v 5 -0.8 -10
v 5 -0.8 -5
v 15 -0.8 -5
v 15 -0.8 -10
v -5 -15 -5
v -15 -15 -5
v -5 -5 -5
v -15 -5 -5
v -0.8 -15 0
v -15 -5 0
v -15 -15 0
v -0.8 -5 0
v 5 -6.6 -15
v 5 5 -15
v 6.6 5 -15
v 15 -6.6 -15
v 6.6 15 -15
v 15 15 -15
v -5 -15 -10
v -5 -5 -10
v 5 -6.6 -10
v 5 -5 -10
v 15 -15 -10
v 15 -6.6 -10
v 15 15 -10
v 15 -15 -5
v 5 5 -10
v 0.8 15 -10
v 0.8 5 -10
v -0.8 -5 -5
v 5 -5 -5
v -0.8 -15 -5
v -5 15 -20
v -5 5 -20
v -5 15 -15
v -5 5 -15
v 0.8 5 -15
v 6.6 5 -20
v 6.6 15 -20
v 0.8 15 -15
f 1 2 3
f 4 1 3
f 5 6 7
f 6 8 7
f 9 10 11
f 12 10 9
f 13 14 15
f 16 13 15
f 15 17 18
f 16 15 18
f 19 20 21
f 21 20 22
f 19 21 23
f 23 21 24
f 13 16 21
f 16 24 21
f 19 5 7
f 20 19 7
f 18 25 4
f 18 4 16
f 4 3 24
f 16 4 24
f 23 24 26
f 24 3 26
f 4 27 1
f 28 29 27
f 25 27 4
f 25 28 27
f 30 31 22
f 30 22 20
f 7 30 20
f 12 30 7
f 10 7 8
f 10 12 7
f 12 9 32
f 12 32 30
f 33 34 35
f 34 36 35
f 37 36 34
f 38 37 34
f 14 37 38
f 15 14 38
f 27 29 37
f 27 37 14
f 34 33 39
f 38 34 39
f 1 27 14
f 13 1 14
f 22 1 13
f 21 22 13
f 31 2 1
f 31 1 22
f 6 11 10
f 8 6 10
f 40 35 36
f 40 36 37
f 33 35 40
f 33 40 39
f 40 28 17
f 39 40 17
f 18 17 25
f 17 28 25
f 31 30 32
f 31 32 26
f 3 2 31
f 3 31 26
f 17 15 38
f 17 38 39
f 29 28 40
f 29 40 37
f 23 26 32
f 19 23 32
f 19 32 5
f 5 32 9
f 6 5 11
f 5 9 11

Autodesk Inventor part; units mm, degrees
ref_plane "YZ Plane" through (0, 0, 0) normal (1, 0, 0) x (0, 1, 0)
ref_plane "XZ Plane" through (0, 0, 0) normal (0, 1, 0) x (-1, 0, 0)
ref_plane "XY Plane" through (0, 0, 0) normal (0, 0, 1) x (1, 0, 0)
sketch "草圖15" plane through (0, 0, 0) normal (0, 0, 1) x (1, 0, 0)
  line L0 (5, -5) -> (-5, -5)
  line L1 (-5, -5) -> (-5, 5)
  line L2 (-5, 5) -> (5, 5)
  line L3 (5, 5) -> (5, -5)
  line L4 (5, -5) -> (-5, 5) construction
  line L5 (-5, -5) -> (5, 5) construction
  line L6 (15, -15) -> (-15, -15)
  line L7 (-15, -15) -> (-15, 15)
  line L8 (-15, 15) -> (15, 15)
  line L9 (15, 15) -> (15, -15)
  line L10 (15, -15) -> (-15, 15) construction
  line L11 (-15, -15) -> (15, 15) construction
  line L12 (-15, -15) -> (-0.8, -15)
  line L13 (-0.8, -15) -> (-0.8, -5)
  line L14 (-0.8, -5) -> (-15, -5)
  line L15 (-15, -5) -> (-15, -15)
  line L16 (15, -15) -> (-1.6, -15)
  line L17 (-1.6, -5) -> (15, -5)
  line L18 (15, -5) -> (15, -15)
  line L19 (15, -15) -> (5, -15)
  line L20 (5, -15) -> (5, -0.8)
  line L21 (5, -0.8) -> (15, -0.8)
  line L22 (15, -0.8) -> (15, -15)
  line L23 (15, 15) -> (5, 15)
  line L24 (5, 15) -> (5, -1.6)
  line L25 (15, -1.6) -> (15, 15)
  line L26 (15, 15) -> (0.8, 15)
  line L27 (0.8, 15) -> (0.8, 5)
  line L28 (0.8, 5) -> (15, 5)
  line L29 (15, 5) -> (15, 15)
  line L30 (-15, 15) -> (1.6, 15)
  line L31 (1.6, 5) -> (-15, 5)
  line L32 (-15, 5) -> (-15, 15)
  line L33 (-5, -5) -> (-15, -5)
  line L34 (-15, -5) -> (-15, -15)
  line L35 (-15, -15) -> (-5, -15)
  line L36 (-5, -15) -> (-5, -5)
  line L37 (-0.8, -15) -> (-6.6, -15)
  line L38 (-6.6, -15) -> (-6.6, -5)
  line L39 (-6.6, -5) -> (-0.8, -5)
  line L40 (-0.8, -5) -> (-0.8, -15)
  line L41 (5, -0.8) -> (15, -0.8)
  line L42 (15, -0.8) -> (15, -6.6)
  line L43 (15, -6.6) -> (5, -6.6)
  line L44 (5, -6.6) -> (5, -0.8)
  line L45 (0.8, 5) -> (6.6, 5)
  line L46 (6.6, 5) -> (6.6, 15)
  line L47 (6.6, 15) -> (0.8, 15)
  line L48 (0.8, 15) -> (0.8, 5)
  line L49 (0.8, 5) -> (-5, 5)
  line L50 (-5, 5) -> (-5, 15)
  line L51 (-5, 15) -> (0.8, 15)
  line L52 (0.8, 15) -> (0.8, 5)
  point P0 (0, 0)
  point P1 (0, 0)
  point P2 (-15, -5)
  point P3 (15, -0.8)
  point P4 (5, -15)
  point P5 (0.8, 15)
  point P6 (-15, 5)
  point P7 (-5, 5)
  point P8 (15, -5)
  point P9 (-5, -15)
  point P10 (5, 5)
  point P11 (5, 15)
  point P12 (0.8, 15)
  point P13 (-6.6, -5)
  point P14 (-6.6, -15)
  point P15 (5, -6.6)
  point P16 (15, -6.6)
  point P17 (-5, 5)
  point P18 (5, 5)
  point P19 (6.6, 5)
  point P20 (6.6, 15)
  dimension "d38" = 10
  dimension "d39" = 10
  dimension "d40" = 0.8
  dimension "d42" = 0.8
  dimension "d48" = 0.8
  dimension "d54" = 0
  dimension "d55" = 5.8
  dimension "d56" = 5.8
  dimension "d57" = 5.8
  dimension "d58" = 10
extrude "擠出10" add sketch "草圖15" against normal blind 5 contours L13 L6 L36 L0 | L36 L6 L38 L14 | L38 L6 L7 L14
extrude "擠出11" add sketch "草圖15" against normal blind 5 from surface at -5 contours L20 L6 L13 L0 | L3 L21 L9 L17 | L17 L9 L43 L20 | L13 L6 L36 L0 | L43 L9 L6 L20
extrude "擠出12" add sketch "草圖15" against normal blind 5 from surface at -10 contours L3 L21 L9 L17 | L17 L9 L43 L20 | L3 L28 L9 L21 | L2 L27 L8 L24 | L24 L8 L46 L28 | L46 L8 L9 L28
extrude "擠出13" add sketch "草圖15" against normal blind 5 from surface at -15 contours L2 L27 L8 L24 | L24 L8 L46 L28 | L50 L8 L27 L2
equation "\"d39\" = width"
equation "\"d40\" = gap"
equation "\"d42\" = gap"
equation "\"d48\" = gap"
equation "\"d55\" = stack"
equation "\"d56\" = stack"
equation "\"d57\" = stack"
equation "\"d44\" = height"
equation "\"d46\" = height"
equation "\"d50\" = height"
equation "\"d52\" = height"
equation "\"width\" = 10"
equation "\"height\" = 5"
equation "\"gap\" = 0.8"
equation "\"stack\" = 5.8"
properties part number "Template_ladder_2"
